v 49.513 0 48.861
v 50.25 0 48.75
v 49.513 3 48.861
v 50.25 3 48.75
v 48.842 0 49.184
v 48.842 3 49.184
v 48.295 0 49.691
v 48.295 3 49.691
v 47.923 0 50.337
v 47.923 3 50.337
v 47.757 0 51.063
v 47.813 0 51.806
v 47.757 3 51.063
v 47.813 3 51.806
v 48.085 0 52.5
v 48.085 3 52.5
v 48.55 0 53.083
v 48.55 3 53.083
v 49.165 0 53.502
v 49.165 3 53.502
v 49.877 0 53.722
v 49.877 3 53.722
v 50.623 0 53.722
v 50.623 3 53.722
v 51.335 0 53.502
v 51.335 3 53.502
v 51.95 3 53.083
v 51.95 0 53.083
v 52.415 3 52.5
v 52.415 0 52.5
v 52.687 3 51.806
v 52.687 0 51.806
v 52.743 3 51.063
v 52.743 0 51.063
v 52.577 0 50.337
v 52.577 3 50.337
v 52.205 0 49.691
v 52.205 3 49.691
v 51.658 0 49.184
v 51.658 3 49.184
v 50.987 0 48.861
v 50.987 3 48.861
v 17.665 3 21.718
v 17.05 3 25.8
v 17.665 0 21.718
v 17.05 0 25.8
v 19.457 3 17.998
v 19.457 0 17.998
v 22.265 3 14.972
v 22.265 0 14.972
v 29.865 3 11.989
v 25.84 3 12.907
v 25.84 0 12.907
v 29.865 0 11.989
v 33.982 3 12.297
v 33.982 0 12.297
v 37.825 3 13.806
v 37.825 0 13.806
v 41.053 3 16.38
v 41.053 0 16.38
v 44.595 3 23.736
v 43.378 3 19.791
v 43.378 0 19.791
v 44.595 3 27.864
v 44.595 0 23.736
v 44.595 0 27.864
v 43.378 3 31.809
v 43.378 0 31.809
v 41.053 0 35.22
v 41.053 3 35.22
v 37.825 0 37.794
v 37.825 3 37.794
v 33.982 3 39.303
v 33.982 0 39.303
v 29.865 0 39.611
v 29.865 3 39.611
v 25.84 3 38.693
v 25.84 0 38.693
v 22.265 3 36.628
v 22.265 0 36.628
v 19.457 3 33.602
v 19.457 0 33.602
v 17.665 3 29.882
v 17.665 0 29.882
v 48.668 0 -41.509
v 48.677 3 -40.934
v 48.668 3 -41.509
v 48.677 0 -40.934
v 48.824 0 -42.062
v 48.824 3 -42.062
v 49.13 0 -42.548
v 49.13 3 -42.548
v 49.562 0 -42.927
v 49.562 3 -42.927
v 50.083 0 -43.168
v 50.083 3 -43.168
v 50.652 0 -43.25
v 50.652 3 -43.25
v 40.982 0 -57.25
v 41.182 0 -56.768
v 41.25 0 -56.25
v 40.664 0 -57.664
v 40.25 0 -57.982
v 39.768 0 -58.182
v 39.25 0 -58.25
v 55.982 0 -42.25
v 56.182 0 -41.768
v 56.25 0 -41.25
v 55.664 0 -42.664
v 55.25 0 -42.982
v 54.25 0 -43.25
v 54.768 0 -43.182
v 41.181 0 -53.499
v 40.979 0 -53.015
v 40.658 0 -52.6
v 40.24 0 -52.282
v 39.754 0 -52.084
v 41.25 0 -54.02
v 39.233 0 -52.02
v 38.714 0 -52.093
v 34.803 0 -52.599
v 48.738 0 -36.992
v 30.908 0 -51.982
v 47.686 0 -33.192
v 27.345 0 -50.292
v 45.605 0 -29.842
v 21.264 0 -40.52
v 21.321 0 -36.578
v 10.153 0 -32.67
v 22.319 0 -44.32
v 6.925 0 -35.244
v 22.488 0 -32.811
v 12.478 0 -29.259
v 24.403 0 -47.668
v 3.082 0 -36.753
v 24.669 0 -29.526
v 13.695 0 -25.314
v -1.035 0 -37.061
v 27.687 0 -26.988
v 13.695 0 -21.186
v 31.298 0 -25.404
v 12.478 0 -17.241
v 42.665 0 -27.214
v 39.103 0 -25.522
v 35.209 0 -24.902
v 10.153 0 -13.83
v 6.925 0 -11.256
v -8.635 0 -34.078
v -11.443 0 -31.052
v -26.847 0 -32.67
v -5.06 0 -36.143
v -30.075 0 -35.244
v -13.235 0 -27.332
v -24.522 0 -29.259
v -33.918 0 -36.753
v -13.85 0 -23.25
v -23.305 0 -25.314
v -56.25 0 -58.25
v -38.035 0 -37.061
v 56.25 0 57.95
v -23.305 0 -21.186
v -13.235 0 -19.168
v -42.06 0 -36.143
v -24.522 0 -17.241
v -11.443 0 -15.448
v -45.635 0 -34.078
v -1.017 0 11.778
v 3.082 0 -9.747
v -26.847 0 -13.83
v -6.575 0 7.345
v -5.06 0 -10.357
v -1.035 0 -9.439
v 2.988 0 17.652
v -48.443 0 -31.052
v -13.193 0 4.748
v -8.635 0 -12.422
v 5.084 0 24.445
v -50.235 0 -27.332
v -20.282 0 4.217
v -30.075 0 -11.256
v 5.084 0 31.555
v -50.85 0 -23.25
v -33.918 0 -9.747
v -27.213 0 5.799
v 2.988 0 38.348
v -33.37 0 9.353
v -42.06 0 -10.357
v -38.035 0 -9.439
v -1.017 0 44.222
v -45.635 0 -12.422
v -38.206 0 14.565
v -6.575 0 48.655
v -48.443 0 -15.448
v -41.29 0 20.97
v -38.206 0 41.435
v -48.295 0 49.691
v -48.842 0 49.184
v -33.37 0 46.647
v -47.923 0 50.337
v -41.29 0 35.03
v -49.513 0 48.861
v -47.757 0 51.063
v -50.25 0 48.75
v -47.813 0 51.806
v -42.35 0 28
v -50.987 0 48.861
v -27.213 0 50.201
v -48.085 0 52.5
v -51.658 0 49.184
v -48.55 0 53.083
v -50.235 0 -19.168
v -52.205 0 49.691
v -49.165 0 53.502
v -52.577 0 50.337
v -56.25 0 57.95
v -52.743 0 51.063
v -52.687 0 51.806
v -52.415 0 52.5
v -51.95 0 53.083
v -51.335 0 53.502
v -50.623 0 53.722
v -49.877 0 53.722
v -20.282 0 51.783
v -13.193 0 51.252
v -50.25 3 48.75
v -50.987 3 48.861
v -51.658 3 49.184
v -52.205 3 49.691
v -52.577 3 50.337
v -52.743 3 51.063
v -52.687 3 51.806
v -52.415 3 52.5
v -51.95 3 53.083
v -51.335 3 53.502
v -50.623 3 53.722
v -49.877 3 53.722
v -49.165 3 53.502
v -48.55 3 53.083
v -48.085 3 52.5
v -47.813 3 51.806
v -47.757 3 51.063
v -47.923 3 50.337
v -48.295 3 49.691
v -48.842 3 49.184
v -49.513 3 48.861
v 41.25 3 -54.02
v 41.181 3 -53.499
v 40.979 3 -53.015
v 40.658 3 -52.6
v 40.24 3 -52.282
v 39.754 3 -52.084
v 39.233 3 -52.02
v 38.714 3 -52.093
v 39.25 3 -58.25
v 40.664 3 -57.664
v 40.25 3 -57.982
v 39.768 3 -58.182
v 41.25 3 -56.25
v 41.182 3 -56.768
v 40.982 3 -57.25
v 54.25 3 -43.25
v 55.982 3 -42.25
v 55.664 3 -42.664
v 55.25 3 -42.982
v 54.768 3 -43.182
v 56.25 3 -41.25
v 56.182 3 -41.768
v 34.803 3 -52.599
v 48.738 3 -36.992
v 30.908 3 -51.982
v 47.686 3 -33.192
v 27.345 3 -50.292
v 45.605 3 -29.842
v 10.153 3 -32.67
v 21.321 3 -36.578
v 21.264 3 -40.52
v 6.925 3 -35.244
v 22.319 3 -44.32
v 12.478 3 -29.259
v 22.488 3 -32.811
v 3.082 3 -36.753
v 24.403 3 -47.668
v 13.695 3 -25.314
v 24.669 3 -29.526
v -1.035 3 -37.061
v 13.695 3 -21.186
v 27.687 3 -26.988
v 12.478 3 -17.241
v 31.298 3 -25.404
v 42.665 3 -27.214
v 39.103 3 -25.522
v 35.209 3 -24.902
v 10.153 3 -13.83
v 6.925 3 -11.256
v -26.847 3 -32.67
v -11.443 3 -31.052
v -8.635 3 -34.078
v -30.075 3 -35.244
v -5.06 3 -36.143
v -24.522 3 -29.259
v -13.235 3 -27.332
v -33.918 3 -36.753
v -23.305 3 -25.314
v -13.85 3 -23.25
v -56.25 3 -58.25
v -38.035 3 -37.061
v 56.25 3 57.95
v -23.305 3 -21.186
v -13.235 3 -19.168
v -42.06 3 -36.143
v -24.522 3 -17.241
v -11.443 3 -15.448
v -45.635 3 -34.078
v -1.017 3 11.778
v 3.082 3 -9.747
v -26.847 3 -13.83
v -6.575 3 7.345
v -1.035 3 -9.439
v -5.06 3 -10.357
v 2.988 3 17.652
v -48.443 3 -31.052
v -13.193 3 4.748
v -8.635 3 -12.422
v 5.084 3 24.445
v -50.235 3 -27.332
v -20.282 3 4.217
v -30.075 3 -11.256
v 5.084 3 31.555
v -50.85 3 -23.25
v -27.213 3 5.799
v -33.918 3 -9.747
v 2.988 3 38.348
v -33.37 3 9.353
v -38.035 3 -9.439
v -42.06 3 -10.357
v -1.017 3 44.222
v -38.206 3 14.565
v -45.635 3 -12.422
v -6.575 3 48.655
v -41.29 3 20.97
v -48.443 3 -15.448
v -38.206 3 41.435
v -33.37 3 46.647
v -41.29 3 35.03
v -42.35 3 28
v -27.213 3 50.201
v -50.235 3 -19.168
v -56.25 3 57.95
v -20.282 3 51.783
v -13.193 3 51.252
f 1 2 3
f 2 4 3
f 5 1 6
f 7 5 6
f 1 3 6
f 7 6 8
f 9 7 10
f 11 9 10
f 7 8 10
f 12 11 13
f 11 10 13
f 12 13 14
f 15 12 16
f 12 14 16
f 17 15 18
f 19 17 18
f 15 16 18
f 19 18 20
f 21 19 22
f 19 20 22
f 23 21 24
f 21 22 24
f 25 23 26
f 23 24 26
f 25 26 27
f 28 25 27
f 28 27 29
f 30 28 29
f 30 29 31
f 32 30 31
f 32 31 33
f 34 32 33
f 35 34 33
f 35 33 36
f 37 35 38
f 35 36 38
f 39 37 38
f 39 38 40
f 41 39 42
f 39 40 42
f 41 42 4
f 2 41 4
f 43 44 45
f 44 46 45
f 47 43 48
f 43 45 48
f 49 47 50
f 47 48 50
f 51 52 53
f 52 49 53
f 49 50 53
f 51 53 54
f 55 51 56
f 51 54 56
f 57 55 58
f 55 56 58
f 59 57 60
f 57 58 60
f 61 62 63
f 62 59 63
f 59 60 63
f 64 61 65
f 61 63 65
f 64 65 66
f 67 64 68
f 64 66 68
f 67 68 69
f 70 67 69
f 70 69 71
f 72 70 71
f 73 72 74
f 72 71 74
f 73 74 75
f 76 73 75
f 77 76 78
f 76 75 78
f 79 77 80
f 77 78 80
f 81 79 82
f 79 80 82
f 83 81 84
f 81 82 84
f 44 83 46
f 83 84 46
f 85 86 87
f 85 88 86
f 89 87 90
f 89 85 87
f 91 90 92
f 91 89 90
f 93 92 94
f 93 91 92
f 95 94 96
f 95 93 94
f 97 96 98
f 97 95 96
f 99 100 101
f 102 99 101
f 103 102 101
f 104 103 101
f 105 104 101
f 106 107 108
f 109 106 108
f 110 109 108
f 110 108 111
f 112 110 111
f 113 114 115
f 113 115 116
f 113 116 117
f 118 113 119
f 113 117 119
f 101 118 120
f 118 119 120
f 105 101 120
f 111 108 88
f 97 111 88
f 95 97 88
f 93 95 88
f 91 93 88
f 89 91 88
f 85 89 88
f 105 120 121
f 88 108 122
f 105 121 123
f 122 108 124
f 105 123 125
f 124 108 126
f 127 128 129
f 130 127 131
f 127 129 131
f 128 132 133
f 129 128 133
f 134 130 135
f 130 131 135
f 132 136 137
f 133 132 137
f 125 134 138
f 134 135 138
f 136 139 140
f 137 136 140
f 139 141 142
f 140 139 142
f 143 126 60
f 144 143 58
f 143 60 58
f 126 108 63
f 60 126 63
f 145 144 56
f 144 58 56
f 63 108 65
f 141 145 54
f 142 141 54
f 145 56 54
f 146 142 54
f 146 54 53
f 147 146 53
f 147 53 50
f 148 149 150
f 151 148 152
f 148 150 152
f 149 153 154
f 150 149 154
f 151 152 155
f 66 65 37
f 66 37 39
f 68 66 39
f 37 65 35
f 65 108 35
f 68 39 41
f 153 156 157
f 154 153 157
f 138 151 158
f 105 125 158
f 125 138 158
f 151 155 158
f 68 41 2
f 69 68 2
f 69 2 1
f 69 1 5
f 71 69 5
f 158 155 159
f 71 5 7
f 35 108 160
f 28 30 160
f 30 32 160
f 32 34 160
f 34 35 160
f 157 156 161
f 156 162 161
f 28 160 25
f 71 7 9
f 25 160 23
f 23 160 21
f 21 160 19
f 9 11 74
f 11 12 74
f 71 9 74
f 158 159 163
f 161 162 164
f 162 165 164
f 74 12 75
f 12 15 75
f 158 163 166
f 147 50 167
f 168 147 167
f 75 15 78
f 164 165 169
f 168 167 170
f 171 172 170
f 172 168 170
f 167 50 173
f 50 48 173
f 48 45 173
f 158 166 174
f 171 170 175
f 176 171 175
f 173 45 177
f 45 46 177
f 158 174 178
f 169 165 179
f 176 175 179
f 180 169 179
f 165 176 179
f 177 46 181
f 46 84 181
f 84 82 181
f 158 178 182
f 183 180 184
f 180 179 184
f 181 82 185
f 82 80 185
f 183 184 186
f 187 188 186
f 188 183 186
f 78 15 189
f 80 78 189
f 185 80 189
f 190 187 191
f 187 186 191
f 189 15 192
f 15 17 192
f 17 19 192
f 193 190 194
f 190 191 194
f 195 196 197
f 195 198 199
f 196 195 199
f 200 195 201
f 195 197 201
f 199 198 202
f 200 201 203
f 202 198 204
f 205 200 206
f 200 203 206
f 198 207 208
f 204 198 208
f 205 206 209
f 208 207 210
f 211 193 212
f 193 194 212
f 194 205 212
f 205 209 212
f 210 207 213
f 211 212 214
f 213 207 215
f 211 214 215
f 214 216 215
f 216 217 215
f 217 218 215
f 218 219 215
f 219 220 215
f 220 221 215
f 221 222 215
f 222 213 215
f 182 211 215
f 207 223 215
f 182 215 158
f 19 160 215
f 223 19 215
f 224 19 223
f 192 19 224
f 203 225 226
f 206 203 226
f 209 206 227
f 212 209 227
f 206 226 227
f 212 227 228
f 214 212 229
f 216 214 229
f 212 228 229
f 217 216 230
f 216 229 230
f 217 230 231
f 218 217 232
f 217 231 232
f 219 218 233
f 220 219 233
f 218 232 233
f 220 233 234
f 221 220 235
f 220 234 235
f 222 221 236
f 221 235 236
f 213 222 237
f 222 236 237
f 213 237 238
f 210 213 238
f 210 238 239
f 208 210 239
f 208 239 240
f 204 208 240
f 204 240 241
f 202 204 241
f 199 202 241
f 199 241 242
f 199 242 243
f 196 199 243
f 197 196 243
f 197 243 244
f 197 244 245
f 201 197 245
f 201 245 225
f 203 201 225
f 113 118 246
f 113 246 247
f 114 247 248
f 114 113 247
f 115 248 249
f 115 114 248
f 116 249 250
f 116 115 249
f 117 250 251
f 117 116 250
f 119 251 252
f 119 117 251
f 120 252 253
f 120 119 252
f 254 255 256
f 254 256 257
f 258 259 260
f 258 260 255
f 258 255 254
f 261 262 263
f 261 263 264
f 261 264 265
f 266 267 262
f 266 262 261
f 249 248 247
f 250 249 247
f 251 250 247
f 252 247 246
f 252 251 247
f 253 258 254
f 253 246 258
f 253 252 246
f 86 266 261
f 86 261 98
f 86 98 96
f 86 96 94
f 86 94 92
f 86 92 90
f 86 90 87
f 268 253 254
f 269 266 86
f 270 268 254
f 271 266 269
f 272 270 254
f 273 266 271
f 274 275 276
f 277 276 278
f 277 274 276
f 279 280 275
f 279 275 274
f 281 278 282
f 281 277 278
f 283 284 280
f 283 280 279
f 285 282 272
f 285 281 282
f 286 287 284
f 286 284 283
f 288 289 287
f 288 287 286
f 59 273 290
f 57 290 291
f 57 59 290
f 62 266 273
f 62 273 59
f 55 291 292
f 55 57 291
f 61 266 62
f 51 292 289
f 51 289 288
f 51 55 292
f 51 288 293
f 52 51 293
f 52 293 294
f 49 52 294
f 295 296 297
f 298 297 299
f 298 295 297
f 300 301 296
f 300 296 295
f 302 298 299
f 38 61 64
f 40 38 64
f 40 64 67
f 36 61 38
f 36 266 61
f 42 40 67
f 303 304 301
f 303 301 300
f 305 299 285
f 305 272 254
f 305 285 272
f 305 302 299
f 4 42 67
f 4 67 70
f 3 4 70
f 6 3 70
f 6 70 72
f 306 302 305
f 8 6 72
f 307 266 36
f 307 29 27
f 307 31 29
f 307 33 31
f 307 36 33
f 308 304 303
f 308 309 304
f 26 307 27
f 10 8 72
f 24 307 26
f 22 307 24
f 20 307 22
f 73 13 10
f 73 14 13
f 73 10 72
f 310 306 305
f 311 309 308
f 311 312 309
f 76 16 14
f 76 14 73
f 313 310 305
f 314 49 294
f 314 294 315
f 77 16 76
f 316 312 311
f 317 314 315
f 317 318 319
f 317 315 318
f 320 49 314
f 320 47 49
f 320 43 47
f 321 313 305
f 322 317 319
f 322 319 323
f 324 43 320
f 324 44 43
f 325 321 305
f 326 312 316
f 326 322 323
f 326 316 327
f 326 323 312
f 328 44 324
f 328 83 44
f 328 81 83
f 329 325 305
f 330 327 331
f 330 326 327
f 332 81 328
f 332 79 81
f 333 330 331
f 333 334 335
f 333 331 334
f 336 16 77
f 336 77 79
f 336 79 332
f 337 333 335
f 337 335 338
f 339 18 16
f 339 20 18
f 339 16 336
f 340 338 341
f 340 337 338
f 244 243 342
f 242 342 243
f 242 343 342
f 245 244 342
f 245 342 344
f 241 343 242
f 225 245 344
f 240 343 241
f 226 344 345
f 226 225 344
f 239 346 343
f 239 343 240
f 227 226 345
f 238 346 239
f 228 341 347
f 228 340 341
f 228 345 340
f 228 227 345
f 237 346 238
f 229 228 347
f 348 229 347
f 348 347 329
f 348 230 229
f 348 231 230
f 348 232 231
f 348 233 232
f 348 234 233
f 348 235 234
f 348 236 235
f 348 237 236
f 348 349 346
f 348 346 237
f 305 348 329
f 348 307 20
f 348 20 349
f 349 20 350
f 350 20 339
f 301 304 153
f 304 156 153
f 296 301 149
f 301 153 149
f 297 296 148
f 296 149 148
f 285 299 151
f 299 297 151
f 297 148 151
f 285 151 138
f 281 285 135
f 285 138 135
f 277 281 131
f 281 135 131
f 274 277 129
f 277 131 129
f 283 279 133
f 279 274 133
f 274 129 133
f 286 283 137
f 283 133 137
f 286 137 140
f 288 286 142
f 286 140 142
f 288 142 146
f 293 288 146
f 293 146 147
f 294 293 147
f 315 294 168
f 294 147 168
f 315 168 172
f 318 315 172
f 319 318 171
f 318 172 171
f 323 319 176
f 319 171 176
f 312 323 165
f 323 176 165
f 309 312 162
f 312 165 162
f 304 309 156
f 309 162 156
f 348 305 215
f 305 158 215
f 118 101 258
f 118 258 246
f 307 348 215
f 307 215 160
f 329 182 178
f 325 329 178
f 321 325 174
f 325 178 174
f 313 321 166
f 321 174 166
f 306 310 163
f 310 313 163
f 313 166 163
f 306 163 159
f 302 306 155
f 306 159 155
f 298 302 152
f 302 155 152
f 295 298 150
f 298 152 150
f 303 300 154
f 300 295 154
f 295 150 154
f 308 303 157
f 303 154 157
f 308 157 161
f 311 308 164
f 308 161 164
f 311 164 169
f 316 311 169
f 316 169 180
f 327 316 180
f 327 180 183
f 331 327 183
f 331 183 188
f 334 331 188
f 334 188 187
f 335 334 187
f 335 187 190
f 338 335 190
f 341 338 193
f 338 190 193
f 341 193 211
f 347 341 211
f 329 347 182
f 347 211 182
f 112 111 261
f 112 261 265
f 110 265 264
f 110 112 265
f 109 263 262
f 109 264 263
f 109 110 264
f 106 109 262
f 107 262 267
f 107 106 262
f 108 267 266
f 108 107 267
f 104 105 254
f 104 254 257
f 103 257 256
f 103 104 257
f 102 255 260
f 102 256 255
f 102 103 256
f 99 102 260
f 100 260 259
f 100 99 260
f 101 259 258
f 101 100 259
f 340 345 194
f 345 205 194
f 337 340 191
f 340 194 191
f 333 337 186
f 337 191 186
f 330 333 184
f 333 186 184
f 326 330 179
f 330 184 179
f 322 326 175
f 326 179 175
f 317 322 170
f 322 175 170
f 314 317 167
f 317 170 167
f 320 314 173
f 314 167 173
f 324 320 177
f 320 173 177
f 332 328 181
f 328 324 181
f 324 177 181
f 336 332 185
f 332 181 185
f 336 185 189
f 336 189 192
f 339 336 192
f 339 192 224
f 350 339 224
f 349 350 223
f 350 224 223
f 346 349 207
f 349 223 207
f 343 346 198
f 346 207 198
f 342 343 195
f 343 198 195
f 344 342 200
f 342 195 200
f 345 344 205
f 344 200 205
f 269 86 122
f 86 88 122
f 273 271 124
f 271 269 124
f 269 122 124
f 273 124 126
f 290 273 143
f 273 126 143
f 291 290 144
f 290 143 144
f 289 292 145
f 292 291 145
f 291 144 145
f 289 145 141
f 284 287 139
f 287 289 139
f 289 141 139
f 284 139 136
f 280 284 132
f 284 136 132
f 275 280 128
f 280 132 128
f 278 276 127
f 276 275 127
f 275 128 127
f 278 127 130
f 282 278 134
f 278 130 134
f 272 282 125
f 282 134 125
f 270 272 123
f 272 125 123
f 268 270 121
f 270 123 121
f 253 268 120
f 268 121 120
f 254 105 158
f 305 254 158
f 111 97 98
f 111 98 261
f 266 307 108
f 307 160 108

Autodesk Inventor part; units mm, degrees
ref_plane "YZ Plane" through (0, 0, 0) normal (1, 0, 0) x (0, 1, 0)
ref_plane "XZ Plane" through (0, 0, 0) normal (0, 1, 0) x (-1, 0, 0)
ref_plane "XY Plane" through (0, 0, 0) normal (0, 0, 1) x (1, 0, 0)
sketch "Sketch1" plane through (0, 0, 0) normal (0, 1, 0) x (-1, 0, 0)
  circle A0 centre (18.5, 28) radius 23.85
  circle A1 centre (37, -23.25) radius 13.85
  arc A2 (-38.7137, -52.0928) -> (-48.6766, -40.9345) centre (-35, -38.75) ccw
  circle A3 centre (-30.9, 25.8) radius 13.85
  circle A4 centre (0, -23.25) radius 13.85
  line L0 (56.25, 58.25) -> (-56.25, 58.25)
  line L1 (-56.25, -58.25) -> (56.25, -58.25)
  line L2 (0, -105.9299) -> (0, 123.2086) construction
  line L3 (-76.4777, -38.75) -> (-5.35, -38.75) construction
  line L4 (-123.5447, -23.25) -> (82.5572, -23.25) construction
  line L5 (56.25, -58.25) -> (56.25, 58.25) construction
  line L6 (56.25, 58.25) -> (-56.25, 58.25)
  line L7 (-56.25, 58.25) -> (-56.25, -41.25)
  line L8 (-39.25, -58.25) -> (56.25, -58.25)
  line L9 (56.25, -58.25) -> (56.25, 58.25)
  line L10 (-56.25, -58.25) -> (-41.25, -58.25)
  line L11 (-41.25, -56.25) -> (-41.25, -54.0196)
  line L12 (-50.6516, -43.25) -> (-54.25, -43.25)
  line L13 (-56.25, -43.25) -> (-56.25, -58.25)
  arc A5 (-41.25, -56.25) -> (-39.25, -58.25) centre (-39.25, -56.25) ccw
  arc A6 (-56.25, -41.25) -> (-54.25, -43.25) centre (-54.25, -41.25) ccw
  arc A7 (-38.7137, -52.0928) -> (-41.25, -54.0196) centre (-39.25, -54.0196) ccw
  arc A8 (-50.6516, -43.25) -> (-48.6766, -40.9345) centre (-50.6516, -41.25) ccw
  point P0 (0, 0)
  point P1 (0, 0)
  point P2 (-48.0986, -43.25)
  point P3 (-56.25, -43.25)
  point P4 (-41.25, -51.1096)
  dimension "d0" = 47.7
  dimension "d1" = 27.7
  dimension "d2" = 27.7
  dimension "d3" = 27.7
  dimension "d4" = 27.7
  dimension "d5" = 116.5
  dimension "d6" = 112.5
  dimension "d7" = 37
  dimension "d8" = 18.5
  dimension "d9" = 30.9
  dimension "d10" = 19.5
  dimension "d11" = 35
  dimension "d12" = 35
  dimension "d13" = 25.8
  dimension "d14" = 28
  dimension "d20" = 112.5
  dimension "d21" = 56.25
  dimension "d22" = 58.25
  dimension "d23" = 116.5
  dimension "d24" = 23.25
  dimension "d25" = 35
  dimension "d26" = 35
  dimension "d27" = 19.25
  dimension "d28" = 37.75
  dimension "d29" = 30.25
  dimension "d30" = 2
  dimension "d31" = 2
  dimension "d32" = 15
  dimension "d33" = 15
  dimension "d34" = 2
extrude "Extrusion1" add sketch "Sketch1" along normal blind 3
sketch "Sketch2" plane through (0, 0, 0) normal (0, -1, 0) x (1, 0, 0)
  line L0 (70.8974, 51.25) -> (-70.9169, 51.25) construction
  line L1 (-56.25, 58.25) -> (56.25, 58.25) construction
  line L2 (56.25, 58.25) -> (56.25, -41.25) construction
  line L3 (-56.25, -58.25) -> (-56.25, 58.25) construction
  point P0 (0, 0)
  point P1 (50.25, 51.25)
  point P2 (-50.25, 51.25)
  dimension "d35" = 7
  dimension "d36" = 6
  dimension "d37" = 6
hole "Hole1" at (50.25, 0, 51.25) at (-50.25, 0, 51.25) direction (0, 1, 0) diameter 5 end through all
sketch "Sketch3" plane through (-56.25, 0, 58.25) normal (0, 0, 1) x (1, 0, 0)
  line L0 (112.5, 0) -> (112.5, 3) projected
  line L1 (0, 0) -> (112.5, 0)
  line L2 (112.5, 0) -> (112.5, 3)
  line L3 (112.5, 3) -> (0, 3)
  line L4 (0, 3) -> (0, 0)
  point P0 (56.25, 0)
extrude "Extrusion2" cut sketch "Sketch3" against normal blind 0.3
properties part number "Bottle Spacer Base"
